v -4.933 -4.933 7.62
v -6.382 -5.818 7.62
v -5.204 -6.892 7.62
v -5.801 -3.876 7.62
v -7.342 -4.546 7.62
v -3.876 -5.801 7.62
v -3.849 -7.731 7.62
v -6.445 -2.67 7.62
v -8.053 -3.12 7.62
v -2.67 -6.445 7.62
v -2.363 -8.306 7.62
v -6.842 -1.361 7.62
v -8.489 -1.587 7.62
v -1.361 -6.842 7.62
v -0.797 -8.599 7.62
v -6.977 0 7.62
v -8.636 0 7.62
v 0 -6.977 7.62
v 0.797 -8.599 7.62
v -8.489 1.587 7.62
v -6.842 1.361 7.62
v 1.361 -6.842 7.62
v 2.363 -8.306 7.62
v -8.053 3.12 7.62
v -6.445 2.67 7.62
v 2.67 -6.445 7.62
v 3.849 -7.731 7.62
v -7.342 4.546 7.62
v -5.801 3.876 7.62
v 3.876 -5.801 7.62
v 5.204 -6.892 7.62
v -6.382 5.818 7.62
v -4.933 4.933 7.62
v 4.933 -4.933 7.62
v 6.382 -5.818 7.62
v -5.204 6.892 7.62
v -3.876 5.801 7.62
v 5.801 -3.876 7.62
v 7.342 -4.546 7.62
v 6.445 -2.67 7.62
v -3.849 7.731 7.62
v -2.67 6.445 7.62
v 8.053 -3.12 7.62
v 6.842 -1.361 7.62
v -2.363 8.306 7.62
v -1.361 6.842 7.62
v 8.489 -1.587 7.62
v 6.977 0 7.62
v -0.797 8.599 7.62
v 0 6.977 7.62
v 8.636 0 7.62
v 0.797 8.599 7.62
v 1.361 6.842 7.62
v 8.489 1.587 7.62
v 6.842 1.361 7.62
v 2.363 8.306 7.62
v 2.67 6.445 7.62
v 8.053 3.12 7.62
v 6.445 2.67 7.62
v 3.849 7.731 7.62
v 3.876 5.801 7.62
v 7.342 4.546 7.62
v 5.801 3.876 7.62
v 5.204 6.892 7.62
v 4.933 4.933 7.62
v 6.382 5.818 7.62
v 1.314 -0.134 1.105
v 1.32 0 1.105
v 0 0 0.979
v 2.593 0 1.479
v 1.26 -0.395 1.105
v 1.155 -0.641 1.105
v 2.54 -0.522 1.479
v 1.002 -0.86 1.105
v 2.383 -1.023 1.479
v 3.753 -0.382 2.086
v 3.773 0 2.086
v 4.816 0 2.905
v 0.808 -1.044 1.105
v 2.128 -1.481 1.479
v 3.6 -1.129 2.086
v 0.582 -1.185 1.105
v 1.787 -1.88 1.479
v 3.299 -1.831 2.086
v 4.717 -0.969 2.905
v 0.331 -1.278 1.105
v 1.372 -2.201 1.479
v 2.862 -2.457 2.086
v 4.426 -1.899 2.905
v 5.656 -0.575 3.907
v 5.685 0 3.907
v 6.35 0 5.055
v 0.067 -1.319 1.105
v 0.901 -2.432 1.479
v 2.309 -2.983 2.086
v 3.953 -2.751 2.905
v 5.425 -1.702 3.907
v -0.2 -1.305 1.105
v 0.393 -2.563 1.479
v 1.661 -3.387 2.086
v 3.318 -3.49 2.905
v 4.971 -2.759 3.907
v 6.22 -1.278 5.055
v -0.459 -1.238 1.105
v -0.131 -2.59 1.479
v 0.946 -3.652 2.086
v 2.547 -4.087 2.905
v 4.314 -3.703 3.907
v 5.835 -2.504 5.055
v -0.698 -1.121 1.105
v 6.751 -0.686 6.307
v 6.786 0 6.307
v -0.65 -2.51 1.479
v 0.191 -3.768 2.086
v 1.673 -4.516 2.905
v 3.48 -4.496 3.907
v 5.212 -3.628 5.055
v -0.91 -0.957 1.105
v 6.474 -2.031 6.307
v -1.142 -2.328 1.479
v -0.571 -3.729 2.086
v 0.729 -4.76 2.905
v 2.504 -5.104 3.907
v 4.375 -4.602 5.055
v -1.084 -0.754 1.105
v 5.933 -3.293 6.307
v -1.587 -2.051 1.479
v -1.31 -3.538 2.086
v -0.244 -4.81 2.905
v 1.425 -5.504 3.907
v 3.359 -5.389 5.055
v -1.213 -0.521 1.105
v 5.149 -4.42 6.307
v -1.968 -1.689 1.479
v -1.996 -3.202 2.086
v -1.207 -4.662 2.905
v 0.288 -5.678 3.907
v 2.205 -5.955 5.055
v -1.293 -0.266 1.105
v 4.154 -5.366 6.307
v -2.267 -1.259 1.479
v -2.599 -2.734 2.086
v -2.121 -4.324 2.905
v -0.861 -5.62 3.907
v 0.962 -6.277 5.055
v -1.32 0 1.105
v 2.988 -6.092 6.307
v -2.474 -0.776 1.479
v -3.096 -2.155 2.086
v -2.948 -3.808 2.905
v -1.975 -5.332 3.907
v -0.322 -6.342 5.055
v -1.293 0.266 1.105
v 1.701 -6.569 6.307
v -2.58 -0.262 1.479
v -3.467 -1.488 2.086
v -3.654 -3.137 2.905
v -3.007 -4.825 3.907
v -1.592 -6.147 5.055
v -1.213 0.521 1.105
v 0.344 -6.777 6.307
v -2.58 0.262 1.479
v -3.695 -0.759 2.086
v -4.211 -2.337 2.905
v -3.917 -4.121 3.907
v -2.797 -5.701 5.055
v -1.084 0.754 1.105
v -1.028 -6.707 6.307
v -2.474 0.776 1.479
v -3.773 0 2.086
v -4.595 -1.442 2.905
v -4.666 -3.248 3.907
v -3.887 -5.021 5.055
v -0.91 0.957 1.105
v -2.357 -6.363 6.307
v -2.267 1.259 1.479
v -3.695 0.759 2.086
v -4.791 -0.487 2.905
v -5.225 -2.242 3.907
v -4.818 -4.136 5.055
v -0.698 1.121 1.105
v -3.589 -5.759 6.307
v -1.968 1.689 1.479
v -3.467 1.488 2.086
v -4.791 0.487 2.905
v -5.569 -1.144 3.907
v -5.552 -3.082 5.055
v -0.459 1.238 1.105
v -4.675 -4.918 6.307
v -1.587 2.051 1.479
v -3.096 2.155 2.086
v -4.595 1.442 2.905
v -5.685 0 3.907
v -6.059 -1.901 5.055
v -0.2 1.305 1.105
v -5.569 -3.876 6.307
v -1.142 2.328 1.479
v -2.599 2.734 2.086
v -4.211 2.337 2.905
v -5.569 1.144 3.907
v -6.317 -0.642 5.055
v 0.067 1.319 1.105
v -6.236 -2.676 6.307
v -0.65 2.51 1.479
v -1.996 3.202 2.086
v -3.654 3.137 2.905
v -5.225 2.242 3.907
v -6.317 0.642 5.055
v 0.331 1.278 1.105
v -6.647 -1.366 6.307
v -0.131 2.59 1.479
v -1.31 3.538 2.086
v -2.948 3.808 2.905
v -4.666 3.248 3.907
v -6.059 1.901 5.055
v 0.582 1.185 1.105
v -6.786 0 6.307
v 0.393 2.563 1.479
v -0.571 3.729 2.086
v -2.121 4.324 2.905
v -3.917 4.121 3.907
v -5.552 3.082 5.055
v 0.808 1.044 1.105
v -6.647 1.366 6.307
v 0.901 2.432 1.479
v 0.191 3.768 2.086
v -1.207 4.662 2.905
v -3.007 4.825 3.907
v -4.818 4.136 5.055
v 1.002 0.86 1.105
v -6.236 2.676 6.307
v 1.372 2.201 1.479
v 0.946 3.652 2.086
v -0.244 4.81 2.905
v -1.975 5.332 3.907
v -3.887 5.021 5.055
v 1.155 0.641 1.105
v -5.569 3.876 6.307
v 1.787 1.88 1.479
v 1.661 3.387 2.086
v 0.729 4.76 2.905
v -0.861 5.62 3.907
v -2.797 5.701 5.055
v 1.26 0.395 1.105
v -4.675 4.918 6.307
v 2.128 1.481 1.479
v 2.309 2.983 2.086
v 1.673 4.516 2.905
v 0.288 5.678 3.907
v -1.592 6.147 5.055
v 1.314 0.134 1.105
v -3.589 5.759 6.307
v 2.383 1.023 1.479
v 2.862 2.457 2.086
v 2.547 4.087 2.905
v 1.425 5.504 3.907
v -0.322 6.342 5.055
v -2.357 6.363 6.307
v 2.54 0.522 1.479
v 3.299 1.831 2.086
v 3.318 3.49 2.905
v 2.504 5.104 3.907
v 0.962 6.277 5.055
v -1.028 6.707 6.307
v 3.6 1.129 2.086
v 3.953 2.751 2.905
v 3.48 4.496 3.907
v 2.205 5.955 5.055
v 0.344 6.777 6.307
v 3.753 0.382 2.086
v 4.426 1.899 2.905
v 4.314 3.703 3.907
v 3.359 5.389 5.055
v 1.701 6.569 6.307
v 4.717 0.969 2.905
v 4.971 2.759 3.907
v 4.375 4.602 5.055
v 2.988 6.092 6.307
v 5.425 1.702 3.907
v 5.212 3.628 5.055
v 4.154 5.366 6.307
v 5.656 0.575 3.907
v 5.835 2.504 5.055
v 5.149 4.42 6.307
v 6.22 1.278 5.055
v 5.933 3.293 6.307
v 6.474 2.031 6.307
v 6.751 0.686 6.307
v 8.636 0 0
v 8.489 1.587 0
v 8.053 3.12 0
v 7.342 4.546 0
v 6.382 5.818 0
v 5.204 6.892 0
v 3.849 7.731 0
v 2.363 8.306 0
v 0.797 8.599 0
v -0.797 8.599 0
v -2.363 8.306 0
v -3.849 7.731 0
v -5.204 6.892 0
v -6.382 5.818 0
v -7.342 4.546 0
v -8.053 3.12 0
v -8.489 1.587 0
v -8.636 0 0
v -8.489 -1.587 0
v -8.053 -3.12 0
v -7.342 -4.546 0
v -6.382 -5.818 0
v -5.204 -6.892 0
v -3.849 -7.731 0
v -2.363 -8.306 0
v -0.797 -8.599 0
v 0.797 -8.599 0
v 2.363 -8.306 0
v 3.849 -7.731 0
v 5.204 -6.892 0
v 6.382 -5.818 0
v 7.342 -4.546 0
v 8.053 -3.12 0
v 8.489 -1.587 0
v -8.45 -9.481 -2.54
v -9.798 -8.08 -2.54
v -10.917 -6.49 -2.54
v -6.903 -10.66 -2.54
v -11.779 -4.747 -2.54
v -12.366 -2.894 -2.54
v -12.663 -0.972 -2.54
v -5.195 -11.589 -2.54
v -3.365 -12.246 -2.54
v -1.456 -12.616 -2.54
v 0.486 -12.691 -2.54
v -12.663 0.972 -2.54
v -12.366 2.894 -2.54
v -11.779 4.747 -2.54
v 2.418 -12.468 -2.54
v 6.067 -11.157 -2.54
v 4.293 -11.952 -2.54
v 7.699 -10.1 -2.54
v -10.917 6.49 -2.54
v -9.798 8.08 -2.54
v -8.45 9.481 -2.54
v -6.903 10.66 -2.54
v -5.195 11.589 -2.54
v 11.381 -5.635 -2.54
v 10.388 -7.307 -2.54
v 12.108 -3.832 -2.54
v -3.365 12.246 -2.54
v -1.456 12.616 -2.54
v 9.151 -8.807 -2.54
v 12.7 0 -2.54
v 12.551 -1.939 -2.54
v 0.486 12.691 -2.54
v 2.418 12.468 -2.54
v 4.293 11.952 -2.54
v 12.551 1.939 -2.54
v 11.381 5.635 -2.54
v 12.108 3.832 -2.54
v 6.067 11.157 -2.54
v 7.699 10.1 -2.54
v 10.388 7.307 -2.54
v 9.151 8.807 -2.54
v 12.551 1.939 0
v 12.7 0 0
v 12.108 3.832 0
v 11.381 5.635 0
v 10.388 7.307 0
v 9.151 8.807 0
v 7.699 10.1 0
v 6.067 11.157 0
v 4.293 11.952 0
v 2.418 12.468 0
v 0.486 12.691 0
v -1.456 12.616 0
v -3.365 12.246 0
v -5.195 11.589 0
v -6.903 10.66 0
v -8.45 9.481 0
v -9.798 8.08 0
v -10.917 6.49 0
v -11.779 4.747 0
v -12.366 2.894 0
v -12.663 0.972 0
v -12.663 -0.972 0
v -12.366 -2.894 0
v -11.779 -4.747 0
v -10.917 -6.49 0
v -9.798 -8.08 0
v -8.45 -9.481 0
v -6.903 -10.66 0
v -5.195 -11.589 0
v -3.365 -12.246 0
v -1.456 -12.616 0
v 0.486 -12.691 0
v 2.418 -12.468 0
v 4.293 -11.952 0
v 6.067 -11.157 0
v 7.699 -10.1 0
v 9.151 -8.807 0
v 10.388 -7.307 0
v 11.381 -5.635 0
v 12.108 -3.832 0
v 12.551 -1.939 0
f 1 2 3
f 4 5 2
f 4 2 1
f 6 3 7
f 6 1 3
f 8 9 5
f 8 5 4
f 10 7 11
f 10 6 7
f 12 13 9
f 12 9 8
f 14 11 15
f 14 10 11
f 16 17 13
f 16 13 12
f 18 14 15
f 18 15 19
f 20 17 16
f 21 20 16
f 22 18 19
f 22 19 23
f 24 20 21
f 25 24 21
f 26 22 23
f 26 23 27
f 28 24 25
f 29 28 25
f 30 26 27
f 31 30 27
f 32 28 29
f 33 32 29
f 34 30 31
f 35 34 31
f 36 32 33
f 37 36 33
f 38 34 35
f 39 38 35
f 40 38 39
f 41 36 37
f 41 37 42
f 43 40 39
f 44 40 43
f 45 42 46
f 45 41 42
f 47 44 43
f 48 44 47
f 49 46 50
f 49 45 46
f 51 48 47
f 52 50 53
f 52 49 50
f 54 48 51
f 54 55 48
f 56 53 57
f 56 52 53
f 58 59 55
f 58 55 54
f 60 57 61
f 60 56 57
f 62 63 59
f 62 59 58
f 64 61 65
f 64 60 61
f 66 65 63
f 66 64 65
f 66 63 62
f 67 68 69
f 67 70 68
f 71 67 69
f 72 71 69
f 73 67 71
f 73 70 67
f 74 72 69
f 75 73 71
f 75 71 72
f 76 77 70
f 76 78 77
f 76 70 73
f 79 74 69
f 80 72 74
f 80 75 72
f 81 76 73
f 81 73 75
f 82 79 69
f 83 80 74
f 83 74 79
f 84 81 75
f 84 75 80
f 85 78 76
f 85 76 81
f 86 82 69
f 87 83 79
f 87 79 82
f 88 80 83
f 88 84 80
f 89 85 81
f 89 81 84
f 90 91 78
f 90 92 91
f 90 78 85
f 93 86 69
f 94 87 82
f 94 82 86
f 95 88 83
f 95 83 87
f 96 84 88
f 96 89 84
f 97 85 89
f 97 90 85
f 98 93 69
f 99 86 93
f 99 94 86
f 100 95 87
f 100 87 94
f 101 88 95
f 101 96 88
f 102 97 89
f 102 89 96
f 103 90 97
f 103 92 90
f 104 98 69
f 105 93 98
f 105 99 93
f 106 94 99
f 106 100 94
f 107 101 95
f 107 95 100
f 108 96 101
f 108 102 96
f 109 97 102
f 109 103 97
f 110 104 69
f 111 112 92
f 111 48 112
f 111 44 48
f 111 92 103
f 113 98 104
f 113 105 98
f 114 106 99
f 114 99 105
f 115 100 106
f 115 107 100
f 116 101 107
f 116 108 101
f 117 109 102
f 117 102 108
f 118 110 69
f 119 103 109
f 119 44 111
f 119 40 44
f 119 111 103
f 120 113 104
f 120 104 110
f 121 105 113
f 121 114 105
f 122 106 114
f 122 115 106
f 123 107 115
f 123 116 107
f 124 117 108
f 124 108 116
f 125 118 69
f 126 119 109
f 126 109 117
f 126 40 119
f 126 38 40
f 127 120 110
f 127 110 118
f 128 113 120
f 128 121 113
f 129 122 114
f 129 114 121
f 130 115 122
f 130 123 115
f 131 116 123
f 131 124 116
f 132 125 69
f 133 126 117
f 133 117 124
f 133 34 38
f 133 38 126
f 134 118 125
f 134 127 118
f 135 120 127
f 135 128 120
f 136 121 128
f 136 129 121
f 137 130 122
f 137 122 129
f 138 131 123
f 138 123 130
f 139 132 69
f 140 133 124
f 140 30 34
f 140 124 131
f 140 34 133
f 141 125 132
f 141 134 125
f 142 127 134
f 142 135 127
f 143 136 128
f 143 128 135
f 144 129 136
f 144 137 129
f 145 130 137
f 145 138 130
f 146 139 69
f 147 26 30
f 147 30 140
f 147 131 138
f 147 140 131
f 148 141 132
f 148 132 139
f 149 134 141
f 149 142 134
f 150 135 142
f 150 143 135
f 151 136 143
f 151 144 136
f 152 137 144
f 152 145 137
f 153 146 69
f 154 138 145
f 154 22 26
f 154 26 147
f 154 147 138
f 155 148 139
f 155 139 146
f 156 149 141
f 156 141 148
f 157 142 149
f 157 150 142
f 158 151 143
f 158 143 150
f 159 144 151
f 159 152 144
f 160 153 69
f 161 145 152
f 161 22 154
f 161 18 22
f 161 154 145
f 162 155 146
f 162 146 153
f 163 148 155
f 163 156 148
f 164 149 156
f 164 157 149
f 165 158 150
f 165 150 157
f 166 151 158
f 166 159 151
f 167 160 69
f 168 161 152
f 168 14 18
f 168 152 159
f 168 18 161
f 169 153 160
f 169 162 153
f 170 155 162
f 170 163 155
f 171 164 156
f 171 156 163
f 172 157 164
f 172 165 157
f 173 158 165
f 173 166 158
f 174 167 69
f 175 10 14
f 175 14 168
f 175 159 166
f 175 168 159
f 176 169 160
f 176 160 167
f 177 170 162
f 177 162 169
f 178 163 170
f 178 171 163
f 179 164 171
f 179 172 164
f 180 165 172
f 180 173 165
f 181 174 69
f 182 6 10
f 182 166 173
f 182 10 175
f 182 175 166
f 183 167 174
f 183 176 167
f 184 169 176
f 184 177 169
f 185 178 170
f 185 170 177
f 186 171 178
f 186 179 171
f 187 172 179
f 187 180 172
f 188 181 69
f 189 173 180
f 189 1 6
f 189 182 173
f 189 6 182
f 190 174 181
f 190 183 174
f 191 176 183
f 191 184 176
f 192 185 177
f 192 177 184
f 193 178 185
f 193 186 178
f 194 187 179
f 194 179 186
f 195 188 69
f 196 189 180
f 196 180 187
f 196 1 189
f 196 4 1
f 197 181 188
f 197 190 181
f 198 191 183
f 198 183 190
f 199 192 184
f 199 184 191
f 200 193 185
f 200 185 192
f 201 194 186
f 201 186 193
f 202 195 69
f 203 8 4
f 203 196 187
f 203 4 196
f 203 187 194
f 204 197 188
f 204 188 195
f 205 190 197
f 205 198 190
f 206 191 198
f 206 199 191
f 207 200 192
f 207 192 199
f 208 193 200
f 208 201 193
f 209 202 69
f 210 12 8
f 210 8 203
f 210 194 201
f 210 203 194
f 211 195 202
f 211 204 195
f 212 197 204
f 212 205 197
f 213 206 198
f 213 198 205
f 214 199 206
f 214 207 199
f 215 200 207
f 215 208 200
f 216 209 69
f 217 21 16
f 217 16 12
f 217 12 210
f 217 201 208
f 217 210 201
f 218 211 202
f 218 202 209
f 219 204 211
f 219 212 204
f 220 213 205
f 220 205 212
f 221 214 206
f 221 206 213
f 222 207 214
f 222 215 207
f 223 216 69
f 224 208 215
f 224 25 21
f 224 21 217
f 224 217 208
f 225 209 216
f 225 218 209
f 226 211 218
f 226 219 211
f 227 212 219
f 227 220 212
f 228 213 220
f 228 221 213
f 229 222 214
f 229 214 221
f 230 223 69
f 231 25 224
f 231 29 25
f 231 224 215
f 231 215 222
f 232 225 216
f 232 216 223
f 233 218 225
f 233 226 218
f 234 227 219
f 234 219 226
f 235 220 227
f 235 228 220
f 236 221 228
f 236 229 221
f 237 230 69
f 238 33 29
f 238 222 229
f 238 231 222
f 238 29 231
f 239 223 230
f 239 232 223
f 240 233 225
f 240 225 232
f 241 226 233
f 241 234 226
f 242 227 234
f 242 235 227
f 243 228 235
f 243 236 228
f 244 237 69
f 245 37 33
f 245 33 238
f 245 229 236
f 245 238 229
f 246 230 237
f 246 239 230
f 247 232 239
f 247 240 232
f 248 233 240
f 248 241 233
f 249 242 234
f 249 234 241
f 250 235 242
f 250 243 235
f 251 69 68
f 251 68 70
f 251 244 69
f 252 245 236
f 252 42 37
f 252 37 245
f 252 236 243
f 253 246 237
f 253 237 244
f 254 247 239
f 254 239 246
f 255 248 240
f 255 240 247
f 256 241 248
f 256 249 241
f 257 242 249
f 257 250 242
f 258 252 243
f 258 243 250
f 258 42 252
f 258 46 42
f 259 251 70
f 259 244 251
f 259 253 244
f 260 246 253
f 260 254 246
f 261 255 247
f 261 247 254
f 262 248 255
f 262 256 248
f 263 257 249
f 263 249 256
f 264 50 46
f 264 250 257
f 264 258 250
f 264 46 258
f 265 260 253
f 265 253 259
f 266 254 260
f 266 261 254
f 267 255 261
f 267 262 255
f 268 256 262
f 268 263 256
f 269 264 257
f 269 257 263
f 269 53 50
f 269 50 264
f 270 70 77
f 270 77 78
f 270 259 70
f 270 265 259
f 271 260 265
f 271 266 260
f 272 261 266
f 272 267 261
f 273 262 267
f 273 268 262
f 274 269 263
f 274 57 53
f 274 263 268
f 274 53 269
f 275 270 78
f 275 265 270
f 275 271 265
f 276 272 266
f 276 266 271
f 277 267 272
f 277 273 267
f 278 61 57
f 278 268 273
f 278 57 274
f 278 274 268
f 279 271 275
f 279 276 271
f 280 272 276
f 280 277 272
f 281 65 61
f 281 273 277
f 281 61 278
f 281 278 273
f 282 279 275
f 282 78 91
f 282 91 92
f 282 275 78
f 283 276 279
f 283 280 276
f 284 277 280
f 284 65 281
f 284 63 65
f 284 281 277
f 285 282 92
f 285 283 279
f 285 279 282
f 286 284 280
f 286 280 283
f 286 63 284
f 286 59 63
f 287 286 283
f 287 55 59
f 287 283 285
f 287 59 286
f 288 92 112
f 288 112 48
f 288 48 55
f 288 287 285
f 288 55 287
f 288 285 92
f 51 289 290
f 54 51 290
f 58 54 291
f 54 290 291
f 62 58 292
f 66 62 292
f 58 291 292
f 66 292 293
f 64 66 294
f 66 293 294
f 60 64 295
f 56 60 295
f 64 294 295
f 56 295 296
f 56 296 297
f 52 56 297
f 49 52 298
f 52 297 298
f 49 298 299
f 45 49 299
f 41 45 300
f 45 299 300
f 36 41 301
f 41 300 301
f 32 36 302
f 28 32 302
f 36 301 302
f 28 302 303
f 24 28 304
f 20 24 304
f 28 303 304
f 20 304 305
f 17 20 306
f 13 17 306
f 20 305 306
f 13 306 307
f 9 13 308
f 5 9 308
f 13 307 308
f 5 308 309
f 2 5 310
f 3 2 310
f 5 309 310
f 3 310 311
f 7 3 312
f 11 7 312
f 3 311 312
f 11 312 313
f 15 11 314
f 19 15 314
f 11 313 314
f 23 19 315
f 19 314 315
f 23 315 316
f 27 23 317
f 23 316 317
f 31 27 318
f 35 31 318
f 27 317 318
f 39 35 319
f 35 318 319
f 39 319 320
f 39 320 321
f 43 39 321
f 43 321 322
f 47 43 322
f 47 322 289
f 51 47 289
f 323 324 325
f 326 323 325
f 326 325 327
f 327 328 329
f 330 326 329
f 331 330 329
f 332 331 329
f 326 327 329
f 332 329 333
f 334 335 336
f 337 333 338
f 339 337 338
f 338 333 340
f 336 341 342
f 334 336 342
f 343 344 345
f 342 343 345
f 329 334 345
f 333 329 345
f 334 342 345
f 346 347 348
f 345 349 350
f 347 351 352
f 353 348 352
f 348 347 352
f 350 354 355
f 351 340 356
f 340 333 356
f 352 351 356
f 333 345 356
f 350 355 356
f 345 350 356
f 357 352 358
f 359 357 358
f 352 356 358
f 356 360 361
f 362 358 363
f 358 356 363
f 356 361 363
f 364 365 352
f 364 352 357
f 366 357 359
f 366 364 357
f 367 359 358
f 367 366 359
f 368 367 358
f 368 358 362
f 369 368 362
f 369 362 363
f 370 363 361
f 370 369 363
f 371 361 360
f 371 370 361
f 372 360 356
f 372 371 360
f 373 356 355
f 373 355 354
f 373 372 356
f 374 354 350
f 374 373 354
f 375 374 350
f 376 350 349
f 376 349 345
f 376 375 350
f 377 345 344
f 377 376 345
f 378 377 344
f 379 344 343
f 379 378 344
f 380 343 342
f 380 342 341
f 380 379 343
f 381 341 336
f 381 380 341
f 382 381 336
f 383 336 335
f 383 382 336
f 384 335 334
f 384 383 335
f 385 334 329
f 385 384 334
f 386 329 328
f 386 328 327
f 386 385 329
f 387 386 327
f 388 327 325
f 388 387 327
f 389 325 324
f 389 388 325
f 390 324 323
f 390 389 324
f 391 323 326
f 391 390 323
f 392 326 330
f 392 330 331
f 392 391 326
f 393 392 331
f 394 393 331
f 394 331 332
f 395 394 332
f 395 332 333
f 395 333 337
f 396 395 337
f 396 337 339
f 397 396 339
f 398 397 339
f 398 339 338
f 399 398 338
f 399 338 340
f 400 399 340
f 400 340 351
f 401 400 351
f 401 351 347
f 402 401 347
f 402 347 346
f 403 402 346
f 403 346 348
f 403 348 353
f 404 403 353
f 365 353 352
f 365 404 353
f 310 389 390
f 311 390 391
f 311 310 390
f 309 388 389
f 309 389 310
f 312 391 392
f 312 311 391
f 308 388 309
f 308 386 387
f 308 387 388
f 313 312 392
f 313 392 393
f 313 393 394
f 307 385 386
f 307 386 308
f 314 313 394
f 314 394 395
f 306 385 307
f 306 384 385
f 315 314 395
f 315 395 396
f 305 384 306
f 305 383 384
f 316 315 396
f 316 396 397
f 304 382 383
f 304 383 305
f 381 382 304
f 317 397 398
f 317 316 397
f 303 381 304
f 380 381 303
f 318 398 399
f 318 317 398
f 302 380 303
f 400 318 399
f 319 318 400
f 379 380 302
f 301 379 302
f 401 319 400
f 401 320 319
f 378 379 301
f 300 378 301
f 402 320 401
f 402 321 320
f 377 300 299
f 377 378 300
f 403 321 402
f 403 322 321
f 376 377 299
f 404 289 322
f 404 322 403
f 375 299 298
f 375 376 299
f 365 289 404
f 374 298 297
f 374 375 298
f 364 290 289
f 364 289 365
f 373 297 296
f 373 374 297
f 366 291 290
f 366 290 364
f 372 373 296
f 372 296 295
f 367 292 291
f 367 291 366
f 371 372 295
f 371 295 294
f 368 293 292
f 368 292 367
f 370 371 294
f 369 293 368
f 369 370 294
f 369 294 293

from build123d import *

# Parameters (mm, degrees)
F0_R     = 12.7
F0_R_2   = 8.636
F1_DEPTH = 2.54
F2_DEPTH = 7.62


with BuildPart() as f1:
    # F0 (on Top) → F1 (new body)
    with BuildSketch(Plane.XY):
        Circle(F0_R)
        Circle(F0_R_2, mode=Mode.SUBTRACT)
        Circle(F0_R_2)
    extrude(amount=-F1_DEPTH)

    # F0 (on Top) → F2 (join)
    with BuildSketch(Plane.XY):
        Circle(F0_R_2)
    extrude(amount=F2_DEPTH)

    # F3 (on Front) → F4 (revolve, cut)
    with BuildSketch(Plane.XZ):
        with BuildLine():
            Line((0, 14.949476), (0, 0.979476))
            ThreePointArc((0, 0.979476), (6.985, 7.964476), (0, 14.949476))
        make_face()
    revolve(axis=Axis((0, 0, 5.221219), (0, 0, -1)), mode=Mode.SUBTRACT)


solid = f1.part
